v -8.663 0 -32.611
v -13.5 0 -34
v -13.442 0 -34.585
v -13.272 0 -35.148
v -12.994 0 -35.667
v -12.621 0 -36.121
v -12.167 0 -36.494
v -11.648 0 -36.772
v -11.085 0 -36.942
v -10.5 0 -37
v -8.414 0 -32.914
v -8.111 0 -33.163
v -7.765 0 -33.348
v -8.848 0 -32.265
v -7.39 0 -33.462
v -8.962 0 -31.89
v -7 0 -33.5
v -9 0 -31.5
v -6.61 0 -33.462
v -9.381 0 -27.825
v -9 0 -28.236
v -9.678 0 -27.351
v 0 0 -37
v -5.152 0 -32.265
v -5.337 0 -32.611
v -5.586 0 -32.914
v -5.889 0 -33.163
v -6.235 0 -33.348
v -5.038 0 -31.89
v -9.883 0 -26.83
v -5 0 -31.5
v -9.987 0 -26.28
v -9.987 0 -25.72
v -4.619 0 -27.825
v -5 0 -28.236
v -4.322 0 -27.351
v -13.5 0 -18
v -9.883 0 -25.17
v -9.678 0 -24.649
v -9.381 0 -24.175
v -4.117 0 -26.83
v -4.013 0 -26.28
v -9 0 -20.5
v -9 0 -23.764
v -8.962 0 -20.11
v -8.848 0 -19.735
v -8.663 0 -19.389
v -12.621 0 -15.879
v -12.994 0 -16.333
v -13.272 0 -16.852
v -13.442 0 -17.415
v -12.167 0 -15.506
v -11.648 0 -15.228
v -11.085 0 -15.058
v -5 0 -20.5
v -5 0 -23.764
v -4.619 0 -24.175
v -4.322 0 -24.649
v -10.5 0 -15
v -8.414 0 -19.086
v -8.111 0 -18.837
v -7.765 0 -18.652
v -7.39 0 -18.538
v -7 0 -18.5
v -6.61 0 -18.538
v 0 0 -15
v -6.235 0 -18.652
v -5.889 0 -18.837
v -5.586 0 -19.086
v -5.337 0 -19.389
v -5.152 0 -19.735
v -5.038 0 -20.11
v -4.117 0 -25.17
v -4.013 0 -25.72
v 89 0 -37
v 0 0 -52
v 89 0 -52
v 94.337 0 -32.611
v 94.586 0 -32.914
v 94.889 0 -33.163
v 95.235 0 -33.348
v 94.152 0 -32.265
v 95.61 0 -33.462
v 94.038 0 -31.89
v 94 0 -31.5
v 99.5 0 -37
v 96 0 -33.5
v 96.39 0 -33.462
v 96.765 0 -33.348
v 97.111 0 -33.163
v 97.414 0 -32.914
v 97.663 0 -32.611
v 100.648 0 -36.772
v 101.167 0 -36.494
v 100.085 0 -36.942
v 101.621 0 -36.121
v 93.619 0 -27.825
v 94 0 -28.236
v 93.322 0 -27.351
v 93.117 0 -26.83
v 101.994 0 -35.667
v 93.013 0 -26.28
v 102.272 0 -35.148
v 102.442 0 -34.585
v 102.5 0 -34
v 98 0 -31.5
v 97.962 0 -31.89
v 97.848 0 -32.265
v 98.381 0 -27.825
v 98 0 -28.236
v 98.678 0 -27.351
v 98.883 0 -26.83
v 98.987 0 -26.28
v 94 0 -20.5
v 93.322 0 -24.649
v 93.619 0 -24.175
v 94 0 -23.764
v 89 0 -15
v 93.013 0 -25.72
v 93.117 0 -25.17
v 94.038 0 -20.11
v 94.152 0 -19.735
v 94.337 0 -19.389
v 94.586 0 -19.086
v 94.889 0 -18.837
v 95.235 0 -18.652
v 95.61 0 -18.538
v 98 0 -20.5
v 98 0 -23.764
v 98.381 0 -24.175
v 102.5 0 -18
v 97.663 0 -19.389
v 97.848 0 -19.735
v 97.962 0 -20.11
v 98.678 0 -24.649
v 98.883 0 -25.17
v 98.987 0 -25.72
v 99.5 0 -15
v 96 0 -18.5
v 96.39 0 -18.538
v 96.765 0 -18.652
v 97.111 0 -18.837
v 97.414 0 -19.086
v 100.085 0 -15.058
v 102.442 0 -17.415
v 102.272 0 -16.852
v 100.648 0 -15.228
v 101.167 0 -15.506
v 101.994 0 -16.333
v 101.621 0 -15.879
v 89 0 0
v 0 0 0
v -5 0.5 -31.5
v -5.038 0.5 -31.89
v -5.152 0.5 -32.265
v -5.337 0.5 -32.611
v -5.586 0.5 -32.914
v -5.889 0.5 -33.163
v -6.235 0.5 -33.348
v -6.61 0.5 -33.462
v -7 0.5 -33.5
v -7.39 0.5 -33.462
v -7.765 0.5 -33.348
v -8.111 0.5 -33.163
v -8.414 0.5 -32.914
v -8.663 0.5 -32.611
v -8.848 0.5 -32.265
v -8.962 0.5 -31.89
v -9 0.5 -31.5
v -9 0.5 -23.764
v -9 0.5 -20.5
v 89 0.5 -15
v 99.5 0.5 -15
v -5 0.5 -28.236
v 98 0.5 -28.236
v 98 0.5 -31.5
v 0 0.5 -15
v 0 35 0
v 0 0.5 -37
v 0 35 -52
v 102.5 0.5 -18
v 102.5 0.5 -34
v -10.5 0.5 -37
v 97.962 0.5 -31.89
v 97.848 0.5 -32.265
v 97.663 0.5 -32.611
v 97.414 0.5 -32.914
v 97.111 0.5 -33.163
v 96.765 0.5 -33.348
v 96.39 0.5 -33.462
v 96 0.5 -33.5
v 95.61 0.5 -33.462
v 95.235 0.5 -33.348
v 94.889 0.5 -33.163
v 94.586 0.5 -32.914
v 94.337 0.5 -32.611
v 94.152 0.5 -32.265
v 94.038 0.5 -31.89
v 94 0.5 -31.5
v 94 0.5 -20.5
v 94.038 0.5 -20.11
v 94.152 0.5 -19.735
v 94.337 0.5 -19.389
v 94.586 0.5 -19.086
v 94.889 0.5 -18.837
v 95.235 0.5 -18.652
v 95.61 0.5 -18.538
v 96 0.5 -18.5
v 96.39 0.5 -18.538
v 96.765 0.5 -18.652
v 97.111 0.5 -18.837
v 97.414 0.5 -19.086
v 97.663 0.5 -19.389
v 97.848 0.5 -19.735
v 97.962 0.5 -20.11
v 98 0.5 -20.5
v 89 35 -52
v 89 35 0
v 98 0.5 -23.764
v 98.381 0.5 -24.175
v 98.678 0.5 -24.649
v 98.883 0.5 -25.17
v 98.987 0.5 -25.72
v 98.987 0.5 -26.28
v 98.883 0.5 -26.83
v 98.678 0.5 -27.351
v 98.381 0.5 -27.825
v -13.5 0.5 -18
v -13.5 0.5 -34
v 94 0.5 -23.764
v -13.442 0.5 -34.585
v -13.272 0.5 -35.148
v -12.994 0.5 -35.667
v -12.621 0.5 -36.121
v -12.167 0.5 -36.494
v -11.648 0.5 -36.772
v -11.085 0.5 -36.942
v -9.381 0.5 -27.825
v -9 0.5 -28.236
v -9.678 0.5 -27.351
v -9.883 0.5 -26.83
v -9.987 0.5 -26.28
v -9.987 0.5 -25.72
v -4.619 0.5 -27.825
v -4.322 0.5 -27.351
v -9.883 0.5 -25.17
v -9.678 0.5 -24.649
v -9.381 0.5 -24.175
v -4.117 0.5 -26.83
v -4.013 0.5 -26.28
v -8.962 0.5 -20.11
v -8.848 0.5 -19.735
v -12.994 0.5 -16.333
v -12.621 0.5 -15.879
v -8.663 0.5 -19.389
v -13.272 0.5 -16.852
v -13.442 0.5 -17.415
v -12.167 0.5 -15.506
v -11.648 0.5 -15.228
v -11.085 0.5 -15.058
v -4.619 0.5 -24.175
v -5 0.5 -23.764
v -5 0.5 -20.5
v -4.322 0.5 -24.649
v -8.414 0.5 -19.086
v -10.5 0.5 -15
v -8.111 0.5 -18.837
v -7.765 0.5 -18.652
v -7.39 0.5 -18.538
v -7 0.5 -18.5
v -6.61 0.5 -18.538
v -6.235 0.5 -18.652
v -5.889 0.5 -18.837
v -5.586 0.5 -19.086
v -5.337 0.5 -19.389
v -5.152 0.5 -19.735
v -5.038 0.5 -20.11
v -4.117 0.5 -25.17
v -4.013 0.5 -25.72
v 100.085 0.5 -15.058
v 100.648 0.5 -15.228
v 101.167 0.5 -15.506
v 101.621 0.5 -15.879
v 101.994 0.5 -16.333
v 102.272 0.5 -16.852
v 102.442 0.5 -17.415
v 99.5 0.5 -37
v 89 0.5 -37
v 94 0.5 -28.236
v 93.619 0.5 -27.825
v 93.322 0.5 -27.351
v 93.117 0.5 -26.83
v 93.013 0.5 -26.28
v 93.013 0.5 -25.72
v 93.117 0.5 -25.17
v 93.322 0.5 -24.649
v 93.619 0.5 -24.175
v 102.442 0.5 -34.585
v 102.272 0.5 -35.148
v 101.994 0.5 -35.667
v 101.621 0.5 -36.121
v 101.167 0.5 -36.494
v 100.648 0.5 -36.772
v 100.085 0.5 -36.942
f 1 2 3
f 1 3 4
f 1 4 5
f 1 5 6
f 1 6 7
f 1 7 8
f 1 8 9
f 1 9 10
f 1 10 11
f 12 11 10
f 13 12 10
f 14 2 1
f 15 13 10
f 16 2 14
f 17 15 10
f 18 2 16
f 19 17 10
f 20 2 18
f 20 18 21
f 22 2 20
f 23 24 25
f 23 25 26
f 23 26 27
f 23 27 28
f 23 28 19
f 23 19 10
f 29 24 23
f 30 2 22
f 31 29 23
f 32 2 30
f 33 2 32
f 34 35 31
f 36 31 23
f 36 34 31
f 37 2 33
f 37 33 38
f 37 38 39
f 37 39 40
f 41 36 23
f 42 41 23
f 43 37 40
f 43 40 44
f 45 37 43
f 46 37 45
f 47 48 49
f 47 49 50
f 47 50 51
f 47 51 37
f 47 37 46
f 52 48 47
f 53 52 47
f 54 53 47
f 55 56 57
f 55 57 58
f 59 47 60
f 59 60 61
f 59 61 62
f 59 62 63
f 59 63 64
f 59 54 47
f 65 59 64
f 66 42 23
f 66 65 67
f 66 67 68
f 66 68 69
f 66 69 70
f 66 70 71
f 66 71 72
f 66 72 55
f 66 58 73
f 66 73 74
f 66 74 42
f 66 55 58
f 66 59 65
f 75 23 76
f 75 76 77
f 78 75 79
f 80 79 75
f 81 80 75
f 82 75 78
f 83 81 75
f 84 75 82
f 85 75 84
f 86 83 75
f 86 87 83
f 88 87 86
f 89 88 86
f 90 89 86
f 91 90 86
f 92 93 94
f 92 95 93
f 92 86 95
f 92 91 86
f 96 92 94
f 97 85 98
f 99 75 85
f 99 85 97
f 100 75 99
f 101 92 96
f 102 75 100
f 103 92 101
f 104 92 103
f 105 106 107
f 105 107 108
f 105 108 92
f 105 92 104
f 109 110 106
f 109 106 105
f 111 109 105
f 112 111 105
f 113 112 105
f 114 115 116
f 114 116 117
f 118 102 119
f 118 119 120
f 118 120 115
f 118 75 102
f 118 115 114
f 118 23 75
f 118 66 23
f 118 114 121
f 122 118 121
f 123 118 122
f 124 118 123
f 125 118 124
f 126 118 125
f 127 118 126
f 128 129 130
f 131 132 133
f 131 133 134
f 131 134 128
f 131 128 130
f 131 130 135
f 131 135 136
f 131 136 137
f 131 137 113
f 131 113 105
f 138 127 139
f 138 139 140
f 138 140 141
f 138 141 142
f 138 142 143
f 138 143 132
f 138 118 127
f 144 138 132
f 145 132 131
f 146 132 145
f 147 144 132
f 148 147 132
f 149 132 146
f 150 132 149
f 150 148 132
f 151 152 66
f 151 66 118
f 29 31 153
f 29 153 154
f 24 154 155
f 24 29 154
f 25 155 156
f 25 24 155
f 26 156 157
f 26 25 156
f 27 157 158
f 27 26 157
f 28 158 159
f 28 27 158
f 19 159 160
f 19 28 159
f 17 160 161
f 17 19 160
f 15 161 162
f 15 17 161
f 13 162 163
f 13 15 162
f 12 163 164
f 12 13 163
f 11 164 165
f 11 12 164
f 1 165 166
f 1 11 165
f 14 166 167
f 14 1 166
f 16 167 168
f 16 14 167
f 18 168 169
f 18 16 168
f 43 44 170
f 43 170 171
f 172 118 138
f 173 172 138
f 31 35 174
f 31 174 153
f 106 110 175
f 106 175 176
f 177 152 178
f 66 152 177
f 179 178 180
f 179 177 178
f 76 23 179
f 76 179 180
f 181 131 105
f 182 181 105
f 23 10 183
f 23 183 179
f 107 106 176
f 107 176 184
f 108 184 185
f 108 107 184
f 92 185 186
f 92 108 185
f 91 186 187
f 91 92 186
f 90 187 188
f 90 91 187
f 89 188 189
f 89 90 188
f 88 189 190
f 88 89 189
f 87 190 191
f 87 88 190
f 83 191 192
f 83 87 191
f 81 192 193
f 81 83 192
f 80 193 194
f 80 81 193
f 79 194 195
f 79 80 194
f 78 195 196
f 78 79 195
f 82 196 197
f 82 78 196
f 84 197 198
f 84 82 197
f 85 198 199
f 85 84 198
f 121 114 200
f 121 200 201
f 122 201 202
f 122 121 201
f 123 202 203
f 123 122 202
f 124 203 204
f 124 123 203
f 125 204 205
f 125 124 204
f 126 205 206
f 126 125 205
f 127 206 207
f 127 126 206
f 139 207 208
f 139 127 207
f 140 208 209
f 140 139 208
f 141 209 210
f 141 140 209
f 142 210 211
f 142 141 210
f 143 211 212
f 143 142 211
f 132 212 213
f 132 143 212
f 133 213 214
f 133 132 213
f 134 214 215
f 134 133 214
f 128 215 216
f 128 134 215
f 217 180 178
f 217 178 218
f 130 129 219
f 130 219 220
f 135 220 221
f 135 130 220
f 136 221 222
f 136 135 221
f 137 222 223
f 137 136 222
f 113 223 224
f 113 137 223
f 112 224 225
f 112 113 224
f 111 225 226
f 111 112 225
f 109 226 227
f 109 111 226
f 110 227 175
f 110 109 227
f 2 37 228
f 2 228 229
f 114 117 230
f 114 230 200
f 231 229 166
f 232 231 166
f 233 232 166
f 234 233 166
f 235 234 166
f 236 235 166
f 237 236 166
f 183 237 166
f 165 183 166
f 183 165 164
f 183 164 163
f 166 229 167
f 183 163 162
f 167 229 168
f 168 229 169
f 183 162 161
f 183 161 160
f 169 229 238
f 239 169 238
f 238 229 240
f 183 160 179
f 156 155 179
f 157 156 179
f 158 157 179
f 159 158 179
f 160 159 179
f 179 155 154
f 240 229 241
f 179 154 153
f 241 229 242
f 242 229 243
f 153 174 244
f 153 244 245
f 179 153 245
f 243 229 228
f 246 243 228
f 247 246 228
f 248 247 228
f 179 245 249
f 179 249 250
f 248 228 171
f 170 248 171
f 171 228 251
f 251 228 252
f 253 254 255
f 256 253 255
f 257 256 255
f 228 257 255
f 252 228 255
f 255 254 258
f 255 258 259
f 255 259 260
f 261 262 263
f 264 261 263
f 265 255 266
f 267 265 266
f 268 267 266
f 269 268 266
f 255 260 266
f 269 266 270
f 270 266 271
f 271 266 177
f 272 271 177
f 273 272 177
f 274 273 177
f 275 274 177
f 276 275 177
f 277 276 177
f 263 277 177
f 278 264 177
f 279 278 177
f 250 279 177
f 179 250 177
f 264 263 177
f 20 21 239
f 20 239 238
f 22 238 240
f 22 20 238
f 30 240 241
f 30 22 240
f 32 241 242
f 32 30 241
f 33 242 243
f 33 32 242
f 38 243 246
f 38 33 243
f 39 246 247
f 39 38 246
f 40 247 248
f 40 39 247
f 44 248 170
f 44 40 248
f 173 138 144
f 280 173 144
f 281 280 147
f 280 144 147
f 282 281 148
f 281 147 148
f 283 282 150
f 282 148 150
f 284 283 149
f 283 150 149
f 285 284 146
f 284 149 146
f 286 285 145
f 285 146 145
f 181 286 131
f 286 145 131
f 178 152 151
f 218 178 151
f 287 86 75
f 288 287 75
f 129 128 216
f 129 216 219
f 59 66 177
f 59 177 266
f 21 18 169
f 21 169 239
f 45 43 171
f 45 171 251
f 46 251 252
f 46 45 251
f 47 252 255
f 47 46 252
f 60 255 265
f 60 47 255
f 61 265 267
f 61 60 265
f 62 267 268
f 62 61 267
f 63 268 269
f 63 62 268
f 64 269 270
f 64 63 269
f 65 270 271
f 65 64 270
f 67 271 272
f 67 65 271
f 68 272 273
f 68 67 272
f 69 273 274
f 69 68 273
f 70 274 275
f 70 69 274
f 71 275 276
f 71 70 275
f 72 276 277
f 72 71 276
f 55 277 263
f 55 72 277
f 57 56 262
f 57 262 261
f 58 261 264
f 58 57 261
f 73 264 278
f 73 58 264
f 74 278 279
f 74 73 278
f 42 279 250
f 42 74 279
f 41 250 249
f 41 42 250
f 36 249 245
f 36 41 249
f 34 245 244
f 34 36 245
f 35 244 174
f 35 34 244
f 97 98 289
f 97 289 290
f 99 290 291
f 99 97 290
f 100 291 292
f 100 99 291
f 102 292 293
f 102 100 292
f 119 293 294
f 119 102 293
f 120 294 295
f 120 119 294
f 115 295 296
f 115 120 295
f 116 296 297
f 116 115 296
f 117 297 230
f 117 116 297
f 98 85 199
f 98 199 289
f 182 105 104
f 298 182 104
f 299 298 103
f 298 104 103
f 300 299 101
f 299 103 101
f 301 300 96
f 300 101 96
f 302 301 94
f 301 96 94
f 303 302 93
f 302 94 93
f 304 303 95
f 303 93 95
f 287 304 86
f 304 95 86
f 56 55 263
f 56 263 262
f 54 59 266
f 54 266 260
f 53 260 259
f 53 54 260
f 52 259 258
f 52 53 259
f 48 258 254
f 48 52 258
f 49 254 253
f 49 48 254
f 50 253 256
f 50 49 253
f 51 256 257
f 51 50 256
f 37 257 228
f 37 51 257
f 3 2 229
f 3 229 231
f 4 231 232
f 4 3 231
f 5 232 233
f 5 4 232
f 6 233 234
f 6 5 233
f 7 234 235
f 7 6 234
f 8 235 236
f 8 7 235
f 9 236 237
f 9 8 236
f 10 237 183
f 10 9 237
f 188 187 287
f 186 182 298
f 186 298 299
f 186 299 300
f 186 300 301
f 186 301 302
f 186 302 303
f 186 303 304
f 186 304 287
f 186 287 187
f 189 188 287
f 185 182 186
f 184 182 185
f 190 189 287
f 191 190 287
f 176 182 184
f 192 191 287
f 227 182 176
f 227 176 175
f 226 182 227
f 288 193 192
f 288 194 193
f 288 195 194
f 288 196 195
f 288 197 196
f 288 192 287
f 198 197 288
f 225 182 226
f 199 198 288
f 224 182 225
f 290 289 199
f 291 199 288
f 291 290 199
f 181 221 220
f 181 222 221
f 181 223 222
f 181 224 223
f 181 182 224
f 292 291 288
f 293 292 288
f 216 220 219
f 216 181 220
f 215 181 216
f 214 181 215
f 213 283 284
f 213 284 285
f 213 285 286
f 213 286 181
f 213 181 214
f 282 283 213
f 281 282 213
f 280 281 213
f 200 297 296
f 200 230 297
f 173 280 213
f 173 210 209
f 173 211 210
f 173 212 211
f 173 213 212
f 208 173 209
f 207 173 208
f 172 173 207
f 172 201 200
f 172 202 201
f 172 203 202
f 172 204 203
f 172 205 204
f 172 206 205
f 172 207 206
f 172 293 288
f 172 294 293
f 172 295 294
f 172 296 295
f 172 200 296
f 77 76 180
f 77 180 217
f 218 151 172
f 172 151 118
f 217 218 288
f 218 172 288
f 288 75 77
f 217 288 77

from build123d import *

# Parameters (mm, degrees)
SKETCH_1_W      = 89
SKETCH_1_H      = 52
EXTRUDE_1_DEPTH = 35
EXTRUDE_2_DEPTH = 0.5


with BuildPart() as part:
    # Эскиз1 → Бобышка-Вытянуть1 (new body)
    with BuildSketch(Plane(origin=(0, 0, 0), x_dir=(1, 0, 0), z_dir=(0, 1, 0))):
        with Locations((44.5, 26)):
            Rectangle(SKETCH_1_W, SKETCH_1_H)
    extrude(amount=EXTRUDE_1_DEPTH)

    # Эскиз2 → Бобышка-Вытянуть2 (add)
    with BuildSketch(Plane.XZ):
        with BuildLine():
            Line((-10.5, -37), (13.5, -37))
            Line((13.5, -37), (13.5, -15))
            Line((13.5, -15), (-10.5, -15))
            ThreePointArc((-10.5, -15), (-12.621320344, -15.878679656), (-13.5, -18))
            Line((-13.5, -18), (-13.5, -34))
            ThreePointArc((-13.5, -34), (-12.621320344, -36.121320344), (-10.5, -37))
        make_face()
        with BuildLine():
            Line((-5, -20.5), (-5, -23.763932023))
            ThreePointArc((-5, -23.763932023), (-4, -26), (-5, -28.236067977))
            Line((-5, -28.236067977), (-5, -31.5))
            ThreePointArc((-5, -31.5), (-7, -33.5), (-9, -31.5))
            Line((-9, -31.5), (-9, -28.236067977))
            ThreePointArc((-9, -28.236067977), (-10, -26), (-9, -23.763932023))
            Line((-9, -23.763932023), (-9, -20.5))
            ThreePointArc((-9, -20.5), (-7, -18.5), (-5, -20.5))
        make_face(mode=Mode.SUBTRACT)
        with BuildLine():
            Line((75.5, -37), (75.5, -15))
            Line((75.5, -15), (99.5, -15))
            ThreePointArc((99.5, -15), (101.621320344, -15.878679656), (102.5, -18))
            Line((102.5, -18), (102.5, -34))
            ThreePointArc((102.5, -34), (101.621320344, -36.121320344), (99.5, -37))
            Line((99.5, -37), (75.5, -37))
        make_face()
        with BuildLine():
            Line((98, -28.236067977), (98, -31.5))
            ThreePointArc((98, -31.5), (96, -33.5), (94, -31.5))
            Line((94, -31.5), (94, -28.236067977))
            ThreePointArc((94, -28.236067977), (93, -26), (94, -23.763932022))
            Line((94, -23.763932022), (94, -20.5))
            ThreePointArc((94, -20.5), (96, -18.5), (98, -20.5))
            Line((98, -20.5), (98, -23.763932022))
            ThreePointArc((98, -23.763932022), (99, -26), (98, -28.236067977))
        make_face(mode=Mode.SUBTRACT)
    extrude(amount=-EXTRUDE_2_DEPTH)


solid = part.part
